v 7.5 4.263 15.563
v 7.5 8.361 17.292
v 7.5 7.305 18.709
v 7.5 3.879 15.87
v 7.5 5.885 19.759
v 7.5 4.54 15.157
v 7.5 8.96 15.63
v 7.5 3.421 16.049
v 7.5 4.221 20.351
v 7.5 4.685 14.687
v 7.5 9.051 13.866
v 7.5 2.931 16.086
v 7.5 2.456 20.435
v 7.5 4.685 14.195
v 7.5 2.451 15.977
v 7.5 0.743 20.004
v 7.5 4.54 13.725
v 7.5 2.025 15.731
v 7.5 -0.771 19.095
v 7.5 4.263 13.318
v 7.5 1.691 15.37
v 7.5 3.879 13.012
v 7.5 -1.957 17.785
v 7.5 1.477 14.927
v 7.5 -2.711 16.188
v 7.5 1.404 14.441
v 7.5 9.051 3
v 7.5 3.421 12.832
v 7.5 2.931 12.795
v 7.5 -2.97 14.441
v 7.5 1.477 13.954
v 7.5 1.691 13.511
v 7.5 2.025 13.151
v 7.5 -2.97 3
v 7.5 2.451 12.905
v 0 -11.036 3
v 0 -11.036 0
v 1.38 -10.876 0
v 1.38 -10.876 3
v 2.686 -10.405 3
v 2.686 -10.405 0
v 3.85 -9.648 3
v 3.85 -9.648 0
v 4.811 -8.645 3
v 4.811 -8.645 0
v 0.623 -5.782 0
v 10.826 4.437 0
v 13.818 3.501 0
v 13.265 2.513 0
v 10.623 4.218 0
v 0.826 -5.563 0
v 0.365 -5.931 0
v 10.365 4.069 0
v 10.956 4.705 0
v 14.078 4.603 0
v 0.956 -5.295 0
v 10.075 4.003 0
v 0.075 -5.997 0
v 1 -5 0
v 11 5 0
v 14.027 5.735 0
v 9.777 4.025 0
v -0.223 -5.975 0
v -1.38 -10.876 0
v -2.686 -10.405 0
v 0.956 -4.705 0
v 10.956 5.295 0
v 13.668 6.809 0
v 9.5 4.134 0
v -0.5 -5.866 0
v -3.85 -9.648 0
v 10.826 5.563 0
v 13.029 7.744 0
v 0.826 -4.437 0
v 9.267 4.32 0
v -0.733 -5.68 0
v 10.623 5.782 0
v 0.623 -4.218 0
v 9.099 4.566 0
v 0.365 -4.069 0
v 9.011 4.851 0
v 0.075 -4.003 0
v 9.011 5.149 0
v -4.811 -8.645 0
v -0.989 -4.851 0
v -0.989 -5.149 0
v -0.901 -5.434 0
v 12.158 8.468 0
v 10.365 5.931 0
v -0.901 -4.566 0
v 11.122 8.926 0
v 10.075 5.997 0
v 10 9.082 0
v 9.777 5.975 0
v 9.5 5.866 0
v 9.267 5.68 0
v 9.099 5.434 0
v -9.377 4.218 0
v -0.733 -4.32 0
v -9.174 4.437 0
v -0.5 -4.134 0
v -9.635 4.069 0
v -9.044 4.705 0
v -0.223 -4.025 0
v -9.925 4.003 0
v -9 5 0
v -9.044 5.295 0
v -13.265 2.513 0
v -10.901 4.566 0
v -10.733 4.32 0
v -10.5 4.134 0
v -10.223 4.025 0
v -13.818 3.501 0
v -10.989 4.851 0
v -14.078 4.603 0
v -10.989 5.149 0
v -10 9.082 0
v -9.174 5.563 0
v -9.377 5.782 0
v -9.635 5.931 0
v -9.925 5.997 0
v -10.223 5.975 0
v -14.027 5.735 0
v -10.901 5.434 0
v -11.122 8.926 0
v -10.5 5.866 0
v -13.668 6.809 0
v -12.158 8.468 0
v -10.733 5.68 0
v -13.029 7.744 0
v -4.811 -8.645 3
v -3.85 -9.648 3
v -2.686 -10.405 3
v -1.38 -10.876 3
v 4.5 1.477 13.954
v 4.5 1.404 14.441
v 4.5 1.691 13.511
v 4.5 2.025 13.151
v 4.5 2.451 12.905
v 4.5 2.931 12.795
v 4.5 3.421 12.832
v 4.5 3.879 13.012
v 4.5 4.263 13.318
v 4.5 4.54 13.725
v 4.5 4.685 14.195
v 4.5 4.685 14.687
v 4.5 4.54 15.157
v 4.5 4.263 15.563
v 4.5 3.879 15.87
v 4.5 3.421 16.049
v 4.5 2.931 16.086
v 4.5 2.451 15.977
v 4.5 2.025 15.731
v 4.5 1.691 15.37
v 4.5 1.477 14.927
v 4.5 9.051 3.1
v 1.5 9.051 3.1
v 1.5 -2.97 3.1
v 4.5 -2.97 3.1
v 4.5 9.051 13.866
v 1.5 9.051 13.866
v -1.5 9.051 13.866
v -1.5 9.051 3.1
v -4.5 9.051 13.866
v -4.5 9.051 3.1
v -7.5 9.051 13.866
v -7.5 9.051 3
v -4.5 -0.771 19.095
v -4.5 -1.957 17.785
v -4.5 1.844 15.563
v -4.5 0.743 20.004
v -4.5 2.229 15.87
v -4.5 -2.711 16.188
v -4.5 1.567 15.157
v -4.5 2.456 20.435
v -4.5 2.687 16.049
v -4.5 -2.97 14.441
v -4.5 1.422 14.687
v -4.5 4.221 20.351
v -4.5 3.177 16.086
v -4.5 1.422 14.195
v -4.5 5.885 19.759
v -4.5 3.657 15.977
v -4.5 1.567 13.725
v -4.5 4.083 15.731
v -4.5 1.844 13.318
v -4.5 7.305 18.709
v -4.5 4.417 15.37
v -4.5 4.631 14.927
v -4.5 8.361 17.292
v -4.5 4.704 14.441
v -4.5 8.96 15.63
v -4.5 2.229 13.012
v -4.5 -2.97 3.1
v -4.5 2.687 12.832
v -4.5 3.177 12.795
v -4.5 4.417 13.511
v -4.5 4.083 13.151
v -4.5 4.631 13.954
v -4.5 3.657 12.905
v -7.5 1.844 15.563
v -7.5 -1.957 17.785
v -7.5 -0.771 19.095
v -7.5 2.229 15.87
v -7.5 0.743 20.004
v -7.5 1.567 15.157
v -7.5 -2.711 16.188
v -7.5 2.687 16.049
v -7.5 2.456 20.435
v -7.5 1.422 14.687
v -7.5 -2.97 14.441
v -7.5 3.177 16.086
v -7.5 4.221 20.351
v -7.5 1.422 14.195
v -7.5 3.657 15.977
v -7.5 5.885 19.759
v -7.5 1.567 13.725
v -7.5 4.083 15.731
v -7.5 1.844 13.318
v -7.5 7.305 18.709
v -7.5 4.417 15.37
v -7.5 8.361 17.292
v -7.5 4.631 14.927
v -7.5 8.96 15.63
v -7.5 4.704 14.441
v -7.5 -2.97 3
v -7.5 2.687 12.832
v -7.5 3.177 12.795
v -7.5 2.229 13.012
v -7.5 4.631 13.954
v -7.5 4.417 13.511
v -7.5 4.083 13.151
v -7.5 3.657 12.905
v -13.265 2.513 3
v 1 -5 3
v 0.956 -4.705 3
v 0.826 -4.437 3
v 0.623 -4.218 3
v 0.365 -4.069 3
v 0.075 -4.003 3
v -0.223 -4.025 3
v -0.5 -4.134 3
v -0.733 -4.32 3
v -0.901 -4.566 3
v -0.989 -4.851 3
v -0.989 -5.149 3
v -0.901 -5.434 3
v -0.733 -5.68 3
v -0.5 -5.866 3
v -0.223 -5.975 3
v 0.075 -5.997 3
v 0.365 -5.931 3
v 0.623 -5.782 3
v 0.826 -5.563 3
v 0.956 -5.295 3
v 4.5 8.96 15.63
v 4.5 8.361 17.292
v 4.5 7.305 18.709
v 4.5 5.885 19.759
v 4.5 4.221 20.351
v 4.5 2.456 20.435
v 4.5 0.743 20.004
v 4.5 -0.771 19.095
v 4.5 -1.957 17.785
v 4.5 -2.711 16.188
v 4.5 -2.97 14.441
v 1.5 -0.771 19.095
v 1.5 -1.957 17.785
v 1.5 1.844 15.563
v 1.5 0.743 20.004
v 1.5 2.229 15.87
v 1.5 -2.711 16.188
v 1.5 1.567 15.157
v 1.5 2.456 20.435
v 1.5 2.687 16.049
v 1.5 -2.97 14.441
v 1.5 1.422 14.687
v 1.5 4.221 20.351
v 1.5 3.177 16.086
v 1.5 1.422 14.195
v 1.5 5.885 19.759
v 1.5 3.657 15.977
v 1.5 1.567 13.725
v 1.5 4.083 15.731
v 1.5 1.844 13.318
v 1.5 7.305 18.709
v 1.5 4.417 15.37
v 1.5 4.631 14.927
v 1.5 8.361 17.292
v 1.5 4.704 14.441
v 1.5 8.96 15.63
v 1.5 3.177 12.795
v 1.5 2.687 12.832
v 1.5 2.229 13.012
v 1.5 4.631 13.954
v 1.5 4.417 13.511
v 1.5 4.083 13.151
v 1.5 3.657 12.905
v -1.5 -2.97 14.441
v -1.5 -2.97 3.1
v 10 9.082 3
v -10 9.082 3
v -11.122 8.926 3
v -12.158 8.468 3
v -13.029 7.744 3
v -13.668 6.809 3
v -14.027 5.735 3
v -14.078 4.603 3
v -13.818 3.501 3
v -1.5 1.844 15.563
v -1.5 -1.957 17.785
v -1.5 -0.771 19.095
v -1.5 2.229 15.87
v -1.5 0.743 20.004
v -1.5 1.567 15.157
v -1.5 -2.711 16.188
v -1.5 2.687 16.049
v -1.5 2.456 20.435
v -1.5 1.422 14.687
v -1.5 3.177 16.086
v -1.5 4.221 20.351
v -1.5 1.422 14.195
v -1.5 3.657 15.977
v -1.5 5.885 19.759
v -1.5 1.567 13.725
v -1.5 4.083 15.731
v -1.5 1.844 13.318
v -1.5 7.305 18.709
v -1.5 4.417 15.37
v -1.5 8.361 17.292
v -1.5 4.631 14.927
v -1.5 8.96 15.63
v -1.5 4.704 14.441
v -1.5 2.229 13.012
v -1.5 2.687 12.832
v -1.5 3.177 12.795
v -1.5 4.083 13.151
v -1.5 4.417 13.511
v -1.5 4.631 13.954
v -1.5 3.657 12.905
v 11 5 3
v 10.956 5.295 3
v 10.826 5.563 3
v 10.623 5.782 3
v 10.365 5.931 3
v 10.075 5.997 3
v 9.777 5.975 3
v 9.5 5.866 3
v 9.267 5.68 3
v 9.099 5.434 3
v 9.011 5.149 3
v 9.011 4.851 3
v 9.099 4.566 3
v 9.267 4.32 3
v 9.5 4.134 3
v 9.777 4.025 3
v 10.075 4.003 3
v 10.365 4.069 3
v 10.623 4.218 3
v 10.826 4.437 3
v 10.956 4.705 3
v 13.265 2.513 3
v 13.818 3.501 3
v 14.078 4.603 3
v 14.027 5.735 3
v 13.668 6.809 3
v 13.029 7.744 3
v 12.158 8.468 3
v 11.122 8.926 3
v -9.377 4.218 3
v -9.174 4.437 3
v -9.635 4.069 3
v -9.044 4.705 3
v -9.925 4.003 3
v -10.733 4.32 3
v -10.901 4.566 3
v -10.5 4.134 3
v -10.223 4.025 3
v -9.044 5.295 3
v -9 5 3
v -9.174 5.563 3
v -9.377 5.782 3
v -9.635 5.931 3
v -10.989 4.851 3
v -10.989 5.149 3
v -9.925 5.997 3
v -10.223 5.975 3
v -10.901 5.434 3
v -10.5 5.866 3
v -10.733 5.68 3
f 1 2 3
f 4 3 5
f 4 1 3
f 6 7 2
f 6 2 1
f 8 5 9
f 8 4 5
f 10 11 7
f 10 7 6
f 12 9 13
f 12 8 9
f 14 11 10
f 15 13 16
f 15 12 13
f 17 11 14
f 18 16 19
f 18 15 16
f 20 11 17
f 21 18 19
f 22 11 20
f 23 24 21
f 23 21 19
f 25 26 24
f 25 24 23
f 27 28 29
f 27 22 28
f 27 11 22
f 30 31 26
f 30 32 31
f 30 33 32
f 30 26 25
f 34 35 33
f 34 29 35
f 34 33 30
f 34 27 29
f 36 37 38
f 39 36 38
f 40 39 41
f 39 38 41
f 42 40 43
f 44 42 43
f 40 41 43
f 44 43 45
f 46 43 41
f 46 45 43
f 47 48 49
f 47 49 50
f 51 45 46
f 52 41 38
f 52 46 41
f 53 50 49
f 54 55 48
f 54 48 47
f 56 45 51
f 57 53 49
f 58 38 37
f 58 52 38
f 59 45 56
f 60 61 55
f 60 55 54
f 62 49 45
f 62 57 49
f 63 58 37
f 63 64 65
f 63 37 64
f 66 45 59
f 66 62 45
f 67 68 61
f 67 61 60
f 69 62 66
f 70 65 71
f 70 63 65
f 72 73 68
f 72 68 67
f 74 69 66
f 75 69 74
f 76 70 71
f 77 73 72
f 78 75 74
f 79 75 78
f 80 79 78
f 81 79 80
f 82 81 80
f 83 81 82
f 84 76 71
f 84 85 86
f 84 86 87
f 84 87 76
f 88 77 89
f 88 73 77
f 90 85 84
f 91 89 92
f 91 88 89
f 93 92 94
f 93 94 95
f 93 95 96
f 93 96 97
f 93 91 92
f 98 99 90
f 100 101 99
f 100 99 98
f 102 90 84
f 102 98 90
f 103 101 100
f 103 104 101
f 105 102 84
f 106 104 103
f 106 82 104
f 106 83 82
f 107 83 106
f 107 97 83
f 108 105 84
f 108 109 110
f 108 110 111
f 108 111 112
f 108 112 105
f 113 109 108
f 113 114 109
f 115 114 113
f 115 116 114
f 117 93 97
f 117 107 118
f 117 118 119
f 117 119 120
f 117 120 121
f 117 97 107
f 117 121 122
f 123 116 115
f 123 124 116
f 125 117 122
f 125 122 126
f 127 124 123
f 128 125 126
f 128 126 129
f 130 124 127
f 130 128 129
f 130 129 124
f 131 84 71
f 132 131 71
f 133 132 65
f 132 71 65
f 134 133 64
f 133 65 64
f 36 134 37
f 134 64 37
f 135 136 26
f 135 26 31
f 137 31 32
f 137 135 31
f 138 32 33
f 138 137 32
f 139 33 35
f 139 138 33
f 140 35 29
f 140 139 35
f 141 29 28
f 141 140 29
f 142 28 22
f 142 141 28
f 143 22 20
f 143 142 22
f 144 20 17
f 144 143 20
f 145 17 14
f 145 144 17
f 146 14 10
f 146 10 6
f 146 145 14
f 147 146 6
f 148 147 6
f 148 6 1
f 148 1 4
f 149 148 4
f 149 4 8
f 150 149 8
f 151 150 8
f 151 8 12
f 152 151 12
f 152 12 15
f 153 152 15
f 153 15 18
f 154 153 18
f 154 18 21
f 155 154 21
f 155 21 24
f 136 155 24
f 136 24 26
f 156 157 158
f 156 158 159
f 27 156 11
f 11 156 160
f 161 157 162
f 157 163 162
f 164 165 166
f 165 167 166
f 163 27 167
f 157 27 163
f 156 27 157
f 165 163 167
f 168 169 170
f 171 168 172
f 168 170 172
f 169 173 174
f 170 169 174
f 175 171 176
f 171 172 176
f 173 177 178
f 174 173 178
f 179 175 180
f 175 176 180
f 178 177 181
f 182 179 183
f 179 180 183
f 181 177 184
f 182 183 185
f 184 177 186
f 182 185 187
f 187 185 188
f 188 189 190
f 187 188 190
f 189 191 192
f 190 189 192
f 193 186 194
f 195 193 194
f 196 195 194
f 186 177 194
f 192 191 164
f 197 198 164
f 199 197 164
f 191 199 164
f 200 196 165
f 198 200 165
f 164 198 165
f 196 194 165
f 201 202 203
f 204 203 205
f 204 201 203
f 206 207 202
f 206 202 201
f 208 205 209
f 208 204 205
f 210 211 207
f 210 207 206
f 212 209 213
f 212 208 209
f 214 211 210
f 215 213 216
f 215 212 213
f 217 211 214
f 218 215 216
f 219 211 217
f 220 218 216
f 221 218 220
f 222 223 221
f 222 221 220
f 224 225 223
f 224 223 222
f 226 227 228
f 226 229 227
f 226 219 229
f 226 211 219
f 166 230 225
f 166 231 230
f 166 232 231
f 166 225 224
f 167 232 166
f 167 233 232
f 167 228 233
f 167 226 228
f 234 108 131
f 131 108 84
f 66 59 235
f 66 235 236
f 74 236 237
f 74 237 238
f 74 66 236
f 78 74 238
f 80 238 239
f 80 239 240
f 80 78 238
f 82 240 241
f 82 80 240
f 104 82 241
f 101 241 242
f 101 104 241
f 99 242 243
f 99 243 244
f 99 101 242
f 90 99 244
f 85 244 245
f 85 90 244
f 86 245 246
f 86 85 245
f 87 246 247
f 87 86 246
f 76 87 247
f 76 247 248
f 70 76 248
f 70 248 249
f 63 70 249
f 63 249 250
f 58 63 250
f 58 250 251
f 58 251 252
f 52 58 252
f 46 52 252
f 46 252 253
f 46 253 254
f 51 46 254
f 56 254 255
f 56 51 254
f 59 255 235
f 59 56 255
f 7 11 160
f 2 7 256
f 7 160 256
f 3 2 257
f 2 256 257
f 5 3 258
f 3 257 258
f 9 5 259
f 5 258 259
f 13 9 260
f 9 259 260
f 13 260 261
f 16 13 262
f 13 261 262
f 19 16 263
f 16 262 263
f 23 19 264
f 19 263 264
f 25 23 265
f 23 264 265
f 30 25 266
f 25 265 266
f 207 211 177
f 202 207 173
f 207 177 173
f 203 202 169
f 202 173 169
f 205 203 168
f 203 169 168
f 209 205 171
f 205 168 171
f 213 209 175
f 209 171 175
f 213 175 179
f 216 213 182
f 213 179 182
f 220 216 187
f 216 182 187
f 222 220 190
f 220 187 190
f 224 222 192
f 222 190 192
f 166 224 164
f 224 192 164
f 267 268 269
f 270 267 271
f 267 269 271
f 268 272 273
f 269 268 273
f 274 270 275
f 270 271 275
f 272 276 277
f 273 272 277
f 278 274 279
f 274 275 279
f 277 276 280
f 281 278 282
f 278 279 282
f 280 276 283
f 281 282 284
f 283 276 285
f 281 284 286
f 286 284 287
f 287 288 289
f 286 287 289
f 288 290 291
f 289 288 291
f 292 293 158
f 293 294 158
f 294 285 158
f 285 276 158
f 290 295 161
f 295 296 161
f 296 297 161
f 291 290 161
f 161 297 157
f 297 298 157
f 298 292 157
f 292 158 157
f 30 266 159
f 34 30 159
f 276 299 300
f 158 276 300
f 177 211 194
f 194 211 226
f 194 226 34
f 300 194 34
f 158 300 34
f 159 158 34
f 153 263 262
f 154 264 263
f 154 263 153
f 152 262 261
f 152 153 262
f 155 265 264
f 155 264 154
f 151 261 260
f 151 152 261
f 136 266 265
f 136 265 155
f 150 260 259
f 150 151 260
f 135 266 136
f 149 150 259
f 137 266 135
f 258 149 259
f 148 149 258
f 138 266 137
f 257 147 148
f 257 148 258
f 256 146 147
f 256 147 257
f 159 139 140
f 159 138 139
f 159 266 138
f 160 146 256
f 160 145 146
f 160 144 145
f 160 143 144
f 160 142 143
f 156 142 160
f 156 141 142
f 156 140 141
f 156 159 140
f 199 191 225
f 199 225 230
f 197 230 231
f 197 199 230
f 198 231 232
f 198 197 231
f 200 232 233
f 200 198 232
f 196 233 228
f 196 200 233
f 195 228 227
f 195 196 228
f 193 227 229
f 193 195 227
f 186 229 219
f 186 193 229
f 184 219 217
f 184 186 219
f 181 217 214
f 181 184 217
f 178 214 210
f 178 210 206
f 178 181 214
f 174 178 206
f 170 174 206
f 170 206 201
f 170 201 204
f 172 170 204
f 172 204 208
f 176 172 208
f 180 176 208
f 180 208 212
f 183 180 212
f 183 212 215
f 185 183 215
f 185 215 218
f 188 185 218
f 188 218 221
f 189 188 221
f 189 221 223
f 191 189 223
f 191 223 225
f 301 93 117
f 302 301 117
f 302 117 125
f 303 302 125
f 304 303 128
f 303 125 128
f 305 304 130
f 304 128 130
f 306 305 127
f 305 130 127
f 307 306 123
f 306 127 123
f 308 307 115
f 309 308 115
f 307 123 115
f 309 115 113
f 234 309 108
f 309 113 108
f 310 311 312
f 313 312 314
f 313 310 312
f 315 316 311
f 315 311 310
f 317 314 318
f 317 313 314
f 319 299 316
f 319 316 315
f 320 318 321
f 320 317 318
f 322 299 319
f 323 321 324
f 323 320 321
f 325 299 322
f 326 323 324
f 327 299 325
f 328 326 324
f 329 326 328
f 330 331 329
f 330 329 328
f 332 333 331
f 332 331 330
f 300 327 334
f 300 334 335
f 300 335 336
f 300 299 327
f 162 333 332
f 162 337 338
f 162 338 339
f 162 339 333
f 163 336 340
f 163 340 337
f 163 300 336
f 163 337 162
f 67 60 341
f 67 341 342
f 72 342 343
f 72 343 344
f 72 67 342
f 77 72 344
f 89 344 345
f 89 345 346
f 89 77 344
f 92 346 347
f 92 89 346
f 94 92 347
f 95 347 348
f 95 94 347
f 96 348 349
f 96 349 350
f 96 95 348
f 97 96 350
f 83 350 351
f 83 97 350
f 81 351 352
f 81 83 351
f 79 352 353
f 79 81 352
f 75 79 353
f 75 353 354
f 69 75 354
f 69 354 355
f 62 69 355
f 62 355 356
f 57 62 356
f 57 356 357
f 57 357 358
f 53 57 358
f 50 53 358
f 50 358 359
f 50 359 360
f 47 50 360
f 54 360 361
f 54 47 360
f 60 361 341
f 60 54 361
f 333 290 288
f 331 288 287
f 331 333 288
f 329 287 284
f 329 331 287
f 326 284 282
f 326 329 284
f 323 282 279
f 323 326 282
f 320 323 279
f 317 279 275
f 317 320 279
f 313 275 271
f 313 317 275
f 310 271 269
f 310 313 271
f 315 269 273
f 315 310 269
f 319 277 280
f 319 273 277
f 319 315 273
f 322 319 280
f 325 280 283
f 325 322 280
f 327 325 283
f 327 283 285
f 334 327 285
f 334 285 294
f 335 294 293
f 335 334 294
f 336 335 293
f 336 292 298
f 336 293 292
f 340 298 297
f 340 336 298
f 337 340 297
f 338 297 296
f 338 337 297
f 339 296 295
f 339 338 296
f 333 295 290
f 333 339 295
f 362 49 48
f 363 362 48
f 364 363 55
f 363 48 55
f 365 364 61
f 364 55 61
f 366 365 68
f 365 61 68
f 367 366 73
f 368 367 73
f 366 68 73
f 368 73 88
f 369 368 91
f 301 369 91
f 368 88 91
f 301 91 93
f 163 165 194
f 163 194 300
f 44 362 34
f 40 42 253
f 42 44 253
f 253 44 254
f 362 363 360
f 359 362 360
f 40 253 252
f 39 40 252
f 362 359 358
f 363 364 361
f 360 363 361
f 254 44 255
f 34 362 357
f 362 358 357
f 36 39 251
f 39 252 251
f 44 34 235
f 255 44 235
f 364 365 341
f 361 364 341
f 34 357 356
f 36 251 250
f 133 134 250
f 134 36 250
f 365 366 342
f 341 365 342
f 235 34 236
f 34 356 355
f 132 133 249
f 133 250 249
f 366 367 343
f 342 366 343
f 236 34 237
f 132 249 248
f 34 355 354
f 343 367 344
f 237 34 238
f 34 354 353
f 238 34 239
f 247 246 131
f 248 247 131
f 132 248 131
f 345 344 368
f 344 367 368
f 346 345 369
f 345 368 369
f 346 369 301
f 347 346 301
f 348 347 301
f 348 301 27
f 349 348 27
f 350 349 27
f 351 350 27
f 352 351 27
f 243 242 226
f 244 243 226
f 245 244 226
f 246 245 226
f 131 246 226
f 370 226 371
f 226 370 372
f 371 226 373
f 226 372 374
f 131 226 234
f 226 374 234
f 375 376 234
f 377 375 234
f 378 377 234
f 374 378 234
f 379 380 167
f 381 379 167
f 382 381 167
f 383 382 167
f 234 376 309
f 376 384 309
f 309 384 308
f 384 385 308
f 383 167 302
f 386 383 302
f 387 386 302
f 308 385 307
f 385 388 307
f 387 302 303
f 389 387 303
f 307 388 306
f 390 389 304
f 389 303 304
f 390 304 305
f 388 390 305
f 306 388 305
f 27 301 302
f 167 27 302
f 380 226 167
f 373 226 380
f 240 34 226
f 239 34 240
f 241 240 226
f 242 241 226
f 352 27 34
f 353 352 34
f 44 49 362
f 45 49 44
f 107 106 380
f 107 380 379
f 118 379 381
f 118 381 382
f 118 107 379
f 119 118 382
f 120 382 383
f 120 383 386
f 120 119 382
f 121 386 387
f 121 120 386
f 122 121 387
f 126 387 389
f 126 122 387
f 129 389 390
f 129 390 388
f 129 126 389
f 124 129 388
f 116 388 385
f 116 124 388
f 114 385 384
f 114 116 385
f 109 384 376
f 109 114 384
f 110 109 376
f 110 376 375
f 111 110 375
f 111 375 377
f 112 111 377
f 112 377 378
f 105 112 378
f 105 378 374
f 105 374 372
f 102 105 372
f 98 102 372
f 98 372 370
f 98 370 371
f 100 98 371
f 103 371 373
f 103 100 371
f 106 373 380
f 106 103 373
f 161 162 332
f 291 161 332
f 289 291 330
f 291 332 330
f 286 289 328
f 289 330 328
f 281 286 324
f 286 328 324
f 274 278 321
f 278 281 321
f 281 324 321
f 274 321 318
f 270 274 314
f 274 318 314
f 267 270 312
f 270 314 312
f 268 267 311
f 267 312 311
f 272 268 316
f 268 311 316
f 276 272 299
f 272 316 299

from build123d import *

# Parameters (mm, degrees)
BOX_W           = 3
BOX_H           = 29
BOX_DEPTH       = 23
BOX001_W        = 3
BOX001_H        = 29
BOX001_DEPTH    = 23
SKETCH_R        = 1
PAD_DEPTH       = 3
SKETCH001_R     = 1.65
PAD001_DEPTH    = 1.5
PAD001_FACE17_R = 1.65
PAD002_DEPTH    = 6
PAD002_FACE15_R = 1.65
PAD003_DEPTH    = 6


with BuildPart() as box:
    # Box → Box (new body)
    with BuildSketch(Plane(origin=(1.5, -4.9, 3.1), x_dir=(1, 0, 0), z_dir=(0, 0, 1))):
        with Locations((1.5, 14.5)):
            Rectangle(BOX_W, BOX_H)
    extrude(amount=BOX_DEPTH)


with BuildPart() as box001:
    # Box001 → Box001 (new body)
    with BuildSketch(Plane(origin=(-4.5, -4.9, 3.1), x_dir=(1, 0, 0), z_dir=(0, 0, 1))):
        with Locations((1.5, 14.5)):
            Rectangle(BOX001_W, BOX001_H)
    extrude(amount=BOX001_DEPTH)


with BuildPart() as cut001:
    # Sketch → Pad (new body)
    with BuildSketch(Plane.XY):
        with BuildLine():
            Line((0, 9.082448), (10, 9.082448))
            ThreePointArc((13.264879, 2.512568), (13.6682, 6.809172), (10, 9.082448))
            Line((13.264879, 2.512568), (4.810995, -8.645152))
            ThreePointArc((0, -11.035959), (2.686151, -10.405312), (4.810995, -8.645152))
            ThreePointArc((-4.810995, -8.645152), (-2.686151, -10.405312), (0, -11.035959))
            Line((-13.264879, 2.512568), (-4.810995, -8.645152))
            ThreePointArc((-10, 9.082448), (-13.6682, 6.809172), (-13.264879, 2.512568))
            Line((0, 9.082448), (-10, 9.082448))
        make_face()
        with Locations((10, 5)):
            Circle(SKETCH_R, mode=Mode.SUBTRACT)
        with Locations((0, -5)):
            Circle(SKETCH_R, mode=Mode.SUBTRACT)
        with Locations((-10, 5)):
            Circle(SKETCH_R, mode=Mode.SUBTRACT)
    extrude(amount=PAD_DEPTH)

    # Sketch001 → Pad001 (join, symmetric)
    with BuildSketch(Plane.YZ):
        with BuildLine():
            Line((-2.970462, 2.440773), (-2.970462, 14.440773))
            ThreePointArc((9.050778, 13.866246), (3.341478, 20.458253), (-2.970462, 14.440773))
            Line((9.050778, 13.866246), (9.050778, 2.407893))
            Line((9.050778, 2.407893), (-2.970462, 2.440773))
        make_face()
        with Locations((3.053887, 14.440773)):
            Circle(SKETCH001_R, mode=Mode.SUBTRACT)
    extrude(amount=PAD001_DEPTH, both=True)

    # Pad001 Face17 → Pad002 (add)
    with BuildSketch(Plane(origin=(1.5, 3.044075, 10.994615), x_dir=(0, -1, 0), z_dir=(1, 0, 0))):
        with BuildLine():
            Line((6.014537, 7.994615), (-6.006703, 7.994615))
            Line((-6.006703, 7.994615), (-6.006703, -2.871631))
            ThreePointArc((-6.006703, -2.871631), (-0.297403, -9.463638), (6.014537, -3.446158))
            Line((6.014537, -3.446158), (6.014537, 7.994615))
        make_face()
        with Locations((-0.009812, -3.446158)):
            Circle(PAD001_FACE17_R, mode=Mode.SUBTRACT)
    extrude(amount=PAD002_DEPTH)

    # Pad002 Face15 → Pad003 (add)
    with BuildSketch(Plane(origin=(-1.5, 3.044075, 10.994615), x_dir=(0, 1, 0), z_dir=(-1, 0, 0))):
        with BuildLine():
            Line((6.006703, 7.994615), (-6.014537, 7.994615))
            Line((-6.014537, 7.994615), (-6.014537, -3.446158))
            ThreePointArc((-6.014537, -3.446158), (0.297403, -9.463638), (6.006703, -2.871631))
            Line((6.006703, -2.871631), (6.006703, 7.994615))
        make_face()
        with Locations((0.009812, -3.446158)):
            Circle(PAD002_FACE15_R, mode=Mode.SUBTRACT)
    extrude(amount=PAD003_DEPTH)

    # Cut: cut Box001
    add(box001.part, mode=Mode.SUBTRACT)

    # Cut001: cut Box
    add(box.part, mode=Mode.SUBTRACT)


solid = cut001.part
